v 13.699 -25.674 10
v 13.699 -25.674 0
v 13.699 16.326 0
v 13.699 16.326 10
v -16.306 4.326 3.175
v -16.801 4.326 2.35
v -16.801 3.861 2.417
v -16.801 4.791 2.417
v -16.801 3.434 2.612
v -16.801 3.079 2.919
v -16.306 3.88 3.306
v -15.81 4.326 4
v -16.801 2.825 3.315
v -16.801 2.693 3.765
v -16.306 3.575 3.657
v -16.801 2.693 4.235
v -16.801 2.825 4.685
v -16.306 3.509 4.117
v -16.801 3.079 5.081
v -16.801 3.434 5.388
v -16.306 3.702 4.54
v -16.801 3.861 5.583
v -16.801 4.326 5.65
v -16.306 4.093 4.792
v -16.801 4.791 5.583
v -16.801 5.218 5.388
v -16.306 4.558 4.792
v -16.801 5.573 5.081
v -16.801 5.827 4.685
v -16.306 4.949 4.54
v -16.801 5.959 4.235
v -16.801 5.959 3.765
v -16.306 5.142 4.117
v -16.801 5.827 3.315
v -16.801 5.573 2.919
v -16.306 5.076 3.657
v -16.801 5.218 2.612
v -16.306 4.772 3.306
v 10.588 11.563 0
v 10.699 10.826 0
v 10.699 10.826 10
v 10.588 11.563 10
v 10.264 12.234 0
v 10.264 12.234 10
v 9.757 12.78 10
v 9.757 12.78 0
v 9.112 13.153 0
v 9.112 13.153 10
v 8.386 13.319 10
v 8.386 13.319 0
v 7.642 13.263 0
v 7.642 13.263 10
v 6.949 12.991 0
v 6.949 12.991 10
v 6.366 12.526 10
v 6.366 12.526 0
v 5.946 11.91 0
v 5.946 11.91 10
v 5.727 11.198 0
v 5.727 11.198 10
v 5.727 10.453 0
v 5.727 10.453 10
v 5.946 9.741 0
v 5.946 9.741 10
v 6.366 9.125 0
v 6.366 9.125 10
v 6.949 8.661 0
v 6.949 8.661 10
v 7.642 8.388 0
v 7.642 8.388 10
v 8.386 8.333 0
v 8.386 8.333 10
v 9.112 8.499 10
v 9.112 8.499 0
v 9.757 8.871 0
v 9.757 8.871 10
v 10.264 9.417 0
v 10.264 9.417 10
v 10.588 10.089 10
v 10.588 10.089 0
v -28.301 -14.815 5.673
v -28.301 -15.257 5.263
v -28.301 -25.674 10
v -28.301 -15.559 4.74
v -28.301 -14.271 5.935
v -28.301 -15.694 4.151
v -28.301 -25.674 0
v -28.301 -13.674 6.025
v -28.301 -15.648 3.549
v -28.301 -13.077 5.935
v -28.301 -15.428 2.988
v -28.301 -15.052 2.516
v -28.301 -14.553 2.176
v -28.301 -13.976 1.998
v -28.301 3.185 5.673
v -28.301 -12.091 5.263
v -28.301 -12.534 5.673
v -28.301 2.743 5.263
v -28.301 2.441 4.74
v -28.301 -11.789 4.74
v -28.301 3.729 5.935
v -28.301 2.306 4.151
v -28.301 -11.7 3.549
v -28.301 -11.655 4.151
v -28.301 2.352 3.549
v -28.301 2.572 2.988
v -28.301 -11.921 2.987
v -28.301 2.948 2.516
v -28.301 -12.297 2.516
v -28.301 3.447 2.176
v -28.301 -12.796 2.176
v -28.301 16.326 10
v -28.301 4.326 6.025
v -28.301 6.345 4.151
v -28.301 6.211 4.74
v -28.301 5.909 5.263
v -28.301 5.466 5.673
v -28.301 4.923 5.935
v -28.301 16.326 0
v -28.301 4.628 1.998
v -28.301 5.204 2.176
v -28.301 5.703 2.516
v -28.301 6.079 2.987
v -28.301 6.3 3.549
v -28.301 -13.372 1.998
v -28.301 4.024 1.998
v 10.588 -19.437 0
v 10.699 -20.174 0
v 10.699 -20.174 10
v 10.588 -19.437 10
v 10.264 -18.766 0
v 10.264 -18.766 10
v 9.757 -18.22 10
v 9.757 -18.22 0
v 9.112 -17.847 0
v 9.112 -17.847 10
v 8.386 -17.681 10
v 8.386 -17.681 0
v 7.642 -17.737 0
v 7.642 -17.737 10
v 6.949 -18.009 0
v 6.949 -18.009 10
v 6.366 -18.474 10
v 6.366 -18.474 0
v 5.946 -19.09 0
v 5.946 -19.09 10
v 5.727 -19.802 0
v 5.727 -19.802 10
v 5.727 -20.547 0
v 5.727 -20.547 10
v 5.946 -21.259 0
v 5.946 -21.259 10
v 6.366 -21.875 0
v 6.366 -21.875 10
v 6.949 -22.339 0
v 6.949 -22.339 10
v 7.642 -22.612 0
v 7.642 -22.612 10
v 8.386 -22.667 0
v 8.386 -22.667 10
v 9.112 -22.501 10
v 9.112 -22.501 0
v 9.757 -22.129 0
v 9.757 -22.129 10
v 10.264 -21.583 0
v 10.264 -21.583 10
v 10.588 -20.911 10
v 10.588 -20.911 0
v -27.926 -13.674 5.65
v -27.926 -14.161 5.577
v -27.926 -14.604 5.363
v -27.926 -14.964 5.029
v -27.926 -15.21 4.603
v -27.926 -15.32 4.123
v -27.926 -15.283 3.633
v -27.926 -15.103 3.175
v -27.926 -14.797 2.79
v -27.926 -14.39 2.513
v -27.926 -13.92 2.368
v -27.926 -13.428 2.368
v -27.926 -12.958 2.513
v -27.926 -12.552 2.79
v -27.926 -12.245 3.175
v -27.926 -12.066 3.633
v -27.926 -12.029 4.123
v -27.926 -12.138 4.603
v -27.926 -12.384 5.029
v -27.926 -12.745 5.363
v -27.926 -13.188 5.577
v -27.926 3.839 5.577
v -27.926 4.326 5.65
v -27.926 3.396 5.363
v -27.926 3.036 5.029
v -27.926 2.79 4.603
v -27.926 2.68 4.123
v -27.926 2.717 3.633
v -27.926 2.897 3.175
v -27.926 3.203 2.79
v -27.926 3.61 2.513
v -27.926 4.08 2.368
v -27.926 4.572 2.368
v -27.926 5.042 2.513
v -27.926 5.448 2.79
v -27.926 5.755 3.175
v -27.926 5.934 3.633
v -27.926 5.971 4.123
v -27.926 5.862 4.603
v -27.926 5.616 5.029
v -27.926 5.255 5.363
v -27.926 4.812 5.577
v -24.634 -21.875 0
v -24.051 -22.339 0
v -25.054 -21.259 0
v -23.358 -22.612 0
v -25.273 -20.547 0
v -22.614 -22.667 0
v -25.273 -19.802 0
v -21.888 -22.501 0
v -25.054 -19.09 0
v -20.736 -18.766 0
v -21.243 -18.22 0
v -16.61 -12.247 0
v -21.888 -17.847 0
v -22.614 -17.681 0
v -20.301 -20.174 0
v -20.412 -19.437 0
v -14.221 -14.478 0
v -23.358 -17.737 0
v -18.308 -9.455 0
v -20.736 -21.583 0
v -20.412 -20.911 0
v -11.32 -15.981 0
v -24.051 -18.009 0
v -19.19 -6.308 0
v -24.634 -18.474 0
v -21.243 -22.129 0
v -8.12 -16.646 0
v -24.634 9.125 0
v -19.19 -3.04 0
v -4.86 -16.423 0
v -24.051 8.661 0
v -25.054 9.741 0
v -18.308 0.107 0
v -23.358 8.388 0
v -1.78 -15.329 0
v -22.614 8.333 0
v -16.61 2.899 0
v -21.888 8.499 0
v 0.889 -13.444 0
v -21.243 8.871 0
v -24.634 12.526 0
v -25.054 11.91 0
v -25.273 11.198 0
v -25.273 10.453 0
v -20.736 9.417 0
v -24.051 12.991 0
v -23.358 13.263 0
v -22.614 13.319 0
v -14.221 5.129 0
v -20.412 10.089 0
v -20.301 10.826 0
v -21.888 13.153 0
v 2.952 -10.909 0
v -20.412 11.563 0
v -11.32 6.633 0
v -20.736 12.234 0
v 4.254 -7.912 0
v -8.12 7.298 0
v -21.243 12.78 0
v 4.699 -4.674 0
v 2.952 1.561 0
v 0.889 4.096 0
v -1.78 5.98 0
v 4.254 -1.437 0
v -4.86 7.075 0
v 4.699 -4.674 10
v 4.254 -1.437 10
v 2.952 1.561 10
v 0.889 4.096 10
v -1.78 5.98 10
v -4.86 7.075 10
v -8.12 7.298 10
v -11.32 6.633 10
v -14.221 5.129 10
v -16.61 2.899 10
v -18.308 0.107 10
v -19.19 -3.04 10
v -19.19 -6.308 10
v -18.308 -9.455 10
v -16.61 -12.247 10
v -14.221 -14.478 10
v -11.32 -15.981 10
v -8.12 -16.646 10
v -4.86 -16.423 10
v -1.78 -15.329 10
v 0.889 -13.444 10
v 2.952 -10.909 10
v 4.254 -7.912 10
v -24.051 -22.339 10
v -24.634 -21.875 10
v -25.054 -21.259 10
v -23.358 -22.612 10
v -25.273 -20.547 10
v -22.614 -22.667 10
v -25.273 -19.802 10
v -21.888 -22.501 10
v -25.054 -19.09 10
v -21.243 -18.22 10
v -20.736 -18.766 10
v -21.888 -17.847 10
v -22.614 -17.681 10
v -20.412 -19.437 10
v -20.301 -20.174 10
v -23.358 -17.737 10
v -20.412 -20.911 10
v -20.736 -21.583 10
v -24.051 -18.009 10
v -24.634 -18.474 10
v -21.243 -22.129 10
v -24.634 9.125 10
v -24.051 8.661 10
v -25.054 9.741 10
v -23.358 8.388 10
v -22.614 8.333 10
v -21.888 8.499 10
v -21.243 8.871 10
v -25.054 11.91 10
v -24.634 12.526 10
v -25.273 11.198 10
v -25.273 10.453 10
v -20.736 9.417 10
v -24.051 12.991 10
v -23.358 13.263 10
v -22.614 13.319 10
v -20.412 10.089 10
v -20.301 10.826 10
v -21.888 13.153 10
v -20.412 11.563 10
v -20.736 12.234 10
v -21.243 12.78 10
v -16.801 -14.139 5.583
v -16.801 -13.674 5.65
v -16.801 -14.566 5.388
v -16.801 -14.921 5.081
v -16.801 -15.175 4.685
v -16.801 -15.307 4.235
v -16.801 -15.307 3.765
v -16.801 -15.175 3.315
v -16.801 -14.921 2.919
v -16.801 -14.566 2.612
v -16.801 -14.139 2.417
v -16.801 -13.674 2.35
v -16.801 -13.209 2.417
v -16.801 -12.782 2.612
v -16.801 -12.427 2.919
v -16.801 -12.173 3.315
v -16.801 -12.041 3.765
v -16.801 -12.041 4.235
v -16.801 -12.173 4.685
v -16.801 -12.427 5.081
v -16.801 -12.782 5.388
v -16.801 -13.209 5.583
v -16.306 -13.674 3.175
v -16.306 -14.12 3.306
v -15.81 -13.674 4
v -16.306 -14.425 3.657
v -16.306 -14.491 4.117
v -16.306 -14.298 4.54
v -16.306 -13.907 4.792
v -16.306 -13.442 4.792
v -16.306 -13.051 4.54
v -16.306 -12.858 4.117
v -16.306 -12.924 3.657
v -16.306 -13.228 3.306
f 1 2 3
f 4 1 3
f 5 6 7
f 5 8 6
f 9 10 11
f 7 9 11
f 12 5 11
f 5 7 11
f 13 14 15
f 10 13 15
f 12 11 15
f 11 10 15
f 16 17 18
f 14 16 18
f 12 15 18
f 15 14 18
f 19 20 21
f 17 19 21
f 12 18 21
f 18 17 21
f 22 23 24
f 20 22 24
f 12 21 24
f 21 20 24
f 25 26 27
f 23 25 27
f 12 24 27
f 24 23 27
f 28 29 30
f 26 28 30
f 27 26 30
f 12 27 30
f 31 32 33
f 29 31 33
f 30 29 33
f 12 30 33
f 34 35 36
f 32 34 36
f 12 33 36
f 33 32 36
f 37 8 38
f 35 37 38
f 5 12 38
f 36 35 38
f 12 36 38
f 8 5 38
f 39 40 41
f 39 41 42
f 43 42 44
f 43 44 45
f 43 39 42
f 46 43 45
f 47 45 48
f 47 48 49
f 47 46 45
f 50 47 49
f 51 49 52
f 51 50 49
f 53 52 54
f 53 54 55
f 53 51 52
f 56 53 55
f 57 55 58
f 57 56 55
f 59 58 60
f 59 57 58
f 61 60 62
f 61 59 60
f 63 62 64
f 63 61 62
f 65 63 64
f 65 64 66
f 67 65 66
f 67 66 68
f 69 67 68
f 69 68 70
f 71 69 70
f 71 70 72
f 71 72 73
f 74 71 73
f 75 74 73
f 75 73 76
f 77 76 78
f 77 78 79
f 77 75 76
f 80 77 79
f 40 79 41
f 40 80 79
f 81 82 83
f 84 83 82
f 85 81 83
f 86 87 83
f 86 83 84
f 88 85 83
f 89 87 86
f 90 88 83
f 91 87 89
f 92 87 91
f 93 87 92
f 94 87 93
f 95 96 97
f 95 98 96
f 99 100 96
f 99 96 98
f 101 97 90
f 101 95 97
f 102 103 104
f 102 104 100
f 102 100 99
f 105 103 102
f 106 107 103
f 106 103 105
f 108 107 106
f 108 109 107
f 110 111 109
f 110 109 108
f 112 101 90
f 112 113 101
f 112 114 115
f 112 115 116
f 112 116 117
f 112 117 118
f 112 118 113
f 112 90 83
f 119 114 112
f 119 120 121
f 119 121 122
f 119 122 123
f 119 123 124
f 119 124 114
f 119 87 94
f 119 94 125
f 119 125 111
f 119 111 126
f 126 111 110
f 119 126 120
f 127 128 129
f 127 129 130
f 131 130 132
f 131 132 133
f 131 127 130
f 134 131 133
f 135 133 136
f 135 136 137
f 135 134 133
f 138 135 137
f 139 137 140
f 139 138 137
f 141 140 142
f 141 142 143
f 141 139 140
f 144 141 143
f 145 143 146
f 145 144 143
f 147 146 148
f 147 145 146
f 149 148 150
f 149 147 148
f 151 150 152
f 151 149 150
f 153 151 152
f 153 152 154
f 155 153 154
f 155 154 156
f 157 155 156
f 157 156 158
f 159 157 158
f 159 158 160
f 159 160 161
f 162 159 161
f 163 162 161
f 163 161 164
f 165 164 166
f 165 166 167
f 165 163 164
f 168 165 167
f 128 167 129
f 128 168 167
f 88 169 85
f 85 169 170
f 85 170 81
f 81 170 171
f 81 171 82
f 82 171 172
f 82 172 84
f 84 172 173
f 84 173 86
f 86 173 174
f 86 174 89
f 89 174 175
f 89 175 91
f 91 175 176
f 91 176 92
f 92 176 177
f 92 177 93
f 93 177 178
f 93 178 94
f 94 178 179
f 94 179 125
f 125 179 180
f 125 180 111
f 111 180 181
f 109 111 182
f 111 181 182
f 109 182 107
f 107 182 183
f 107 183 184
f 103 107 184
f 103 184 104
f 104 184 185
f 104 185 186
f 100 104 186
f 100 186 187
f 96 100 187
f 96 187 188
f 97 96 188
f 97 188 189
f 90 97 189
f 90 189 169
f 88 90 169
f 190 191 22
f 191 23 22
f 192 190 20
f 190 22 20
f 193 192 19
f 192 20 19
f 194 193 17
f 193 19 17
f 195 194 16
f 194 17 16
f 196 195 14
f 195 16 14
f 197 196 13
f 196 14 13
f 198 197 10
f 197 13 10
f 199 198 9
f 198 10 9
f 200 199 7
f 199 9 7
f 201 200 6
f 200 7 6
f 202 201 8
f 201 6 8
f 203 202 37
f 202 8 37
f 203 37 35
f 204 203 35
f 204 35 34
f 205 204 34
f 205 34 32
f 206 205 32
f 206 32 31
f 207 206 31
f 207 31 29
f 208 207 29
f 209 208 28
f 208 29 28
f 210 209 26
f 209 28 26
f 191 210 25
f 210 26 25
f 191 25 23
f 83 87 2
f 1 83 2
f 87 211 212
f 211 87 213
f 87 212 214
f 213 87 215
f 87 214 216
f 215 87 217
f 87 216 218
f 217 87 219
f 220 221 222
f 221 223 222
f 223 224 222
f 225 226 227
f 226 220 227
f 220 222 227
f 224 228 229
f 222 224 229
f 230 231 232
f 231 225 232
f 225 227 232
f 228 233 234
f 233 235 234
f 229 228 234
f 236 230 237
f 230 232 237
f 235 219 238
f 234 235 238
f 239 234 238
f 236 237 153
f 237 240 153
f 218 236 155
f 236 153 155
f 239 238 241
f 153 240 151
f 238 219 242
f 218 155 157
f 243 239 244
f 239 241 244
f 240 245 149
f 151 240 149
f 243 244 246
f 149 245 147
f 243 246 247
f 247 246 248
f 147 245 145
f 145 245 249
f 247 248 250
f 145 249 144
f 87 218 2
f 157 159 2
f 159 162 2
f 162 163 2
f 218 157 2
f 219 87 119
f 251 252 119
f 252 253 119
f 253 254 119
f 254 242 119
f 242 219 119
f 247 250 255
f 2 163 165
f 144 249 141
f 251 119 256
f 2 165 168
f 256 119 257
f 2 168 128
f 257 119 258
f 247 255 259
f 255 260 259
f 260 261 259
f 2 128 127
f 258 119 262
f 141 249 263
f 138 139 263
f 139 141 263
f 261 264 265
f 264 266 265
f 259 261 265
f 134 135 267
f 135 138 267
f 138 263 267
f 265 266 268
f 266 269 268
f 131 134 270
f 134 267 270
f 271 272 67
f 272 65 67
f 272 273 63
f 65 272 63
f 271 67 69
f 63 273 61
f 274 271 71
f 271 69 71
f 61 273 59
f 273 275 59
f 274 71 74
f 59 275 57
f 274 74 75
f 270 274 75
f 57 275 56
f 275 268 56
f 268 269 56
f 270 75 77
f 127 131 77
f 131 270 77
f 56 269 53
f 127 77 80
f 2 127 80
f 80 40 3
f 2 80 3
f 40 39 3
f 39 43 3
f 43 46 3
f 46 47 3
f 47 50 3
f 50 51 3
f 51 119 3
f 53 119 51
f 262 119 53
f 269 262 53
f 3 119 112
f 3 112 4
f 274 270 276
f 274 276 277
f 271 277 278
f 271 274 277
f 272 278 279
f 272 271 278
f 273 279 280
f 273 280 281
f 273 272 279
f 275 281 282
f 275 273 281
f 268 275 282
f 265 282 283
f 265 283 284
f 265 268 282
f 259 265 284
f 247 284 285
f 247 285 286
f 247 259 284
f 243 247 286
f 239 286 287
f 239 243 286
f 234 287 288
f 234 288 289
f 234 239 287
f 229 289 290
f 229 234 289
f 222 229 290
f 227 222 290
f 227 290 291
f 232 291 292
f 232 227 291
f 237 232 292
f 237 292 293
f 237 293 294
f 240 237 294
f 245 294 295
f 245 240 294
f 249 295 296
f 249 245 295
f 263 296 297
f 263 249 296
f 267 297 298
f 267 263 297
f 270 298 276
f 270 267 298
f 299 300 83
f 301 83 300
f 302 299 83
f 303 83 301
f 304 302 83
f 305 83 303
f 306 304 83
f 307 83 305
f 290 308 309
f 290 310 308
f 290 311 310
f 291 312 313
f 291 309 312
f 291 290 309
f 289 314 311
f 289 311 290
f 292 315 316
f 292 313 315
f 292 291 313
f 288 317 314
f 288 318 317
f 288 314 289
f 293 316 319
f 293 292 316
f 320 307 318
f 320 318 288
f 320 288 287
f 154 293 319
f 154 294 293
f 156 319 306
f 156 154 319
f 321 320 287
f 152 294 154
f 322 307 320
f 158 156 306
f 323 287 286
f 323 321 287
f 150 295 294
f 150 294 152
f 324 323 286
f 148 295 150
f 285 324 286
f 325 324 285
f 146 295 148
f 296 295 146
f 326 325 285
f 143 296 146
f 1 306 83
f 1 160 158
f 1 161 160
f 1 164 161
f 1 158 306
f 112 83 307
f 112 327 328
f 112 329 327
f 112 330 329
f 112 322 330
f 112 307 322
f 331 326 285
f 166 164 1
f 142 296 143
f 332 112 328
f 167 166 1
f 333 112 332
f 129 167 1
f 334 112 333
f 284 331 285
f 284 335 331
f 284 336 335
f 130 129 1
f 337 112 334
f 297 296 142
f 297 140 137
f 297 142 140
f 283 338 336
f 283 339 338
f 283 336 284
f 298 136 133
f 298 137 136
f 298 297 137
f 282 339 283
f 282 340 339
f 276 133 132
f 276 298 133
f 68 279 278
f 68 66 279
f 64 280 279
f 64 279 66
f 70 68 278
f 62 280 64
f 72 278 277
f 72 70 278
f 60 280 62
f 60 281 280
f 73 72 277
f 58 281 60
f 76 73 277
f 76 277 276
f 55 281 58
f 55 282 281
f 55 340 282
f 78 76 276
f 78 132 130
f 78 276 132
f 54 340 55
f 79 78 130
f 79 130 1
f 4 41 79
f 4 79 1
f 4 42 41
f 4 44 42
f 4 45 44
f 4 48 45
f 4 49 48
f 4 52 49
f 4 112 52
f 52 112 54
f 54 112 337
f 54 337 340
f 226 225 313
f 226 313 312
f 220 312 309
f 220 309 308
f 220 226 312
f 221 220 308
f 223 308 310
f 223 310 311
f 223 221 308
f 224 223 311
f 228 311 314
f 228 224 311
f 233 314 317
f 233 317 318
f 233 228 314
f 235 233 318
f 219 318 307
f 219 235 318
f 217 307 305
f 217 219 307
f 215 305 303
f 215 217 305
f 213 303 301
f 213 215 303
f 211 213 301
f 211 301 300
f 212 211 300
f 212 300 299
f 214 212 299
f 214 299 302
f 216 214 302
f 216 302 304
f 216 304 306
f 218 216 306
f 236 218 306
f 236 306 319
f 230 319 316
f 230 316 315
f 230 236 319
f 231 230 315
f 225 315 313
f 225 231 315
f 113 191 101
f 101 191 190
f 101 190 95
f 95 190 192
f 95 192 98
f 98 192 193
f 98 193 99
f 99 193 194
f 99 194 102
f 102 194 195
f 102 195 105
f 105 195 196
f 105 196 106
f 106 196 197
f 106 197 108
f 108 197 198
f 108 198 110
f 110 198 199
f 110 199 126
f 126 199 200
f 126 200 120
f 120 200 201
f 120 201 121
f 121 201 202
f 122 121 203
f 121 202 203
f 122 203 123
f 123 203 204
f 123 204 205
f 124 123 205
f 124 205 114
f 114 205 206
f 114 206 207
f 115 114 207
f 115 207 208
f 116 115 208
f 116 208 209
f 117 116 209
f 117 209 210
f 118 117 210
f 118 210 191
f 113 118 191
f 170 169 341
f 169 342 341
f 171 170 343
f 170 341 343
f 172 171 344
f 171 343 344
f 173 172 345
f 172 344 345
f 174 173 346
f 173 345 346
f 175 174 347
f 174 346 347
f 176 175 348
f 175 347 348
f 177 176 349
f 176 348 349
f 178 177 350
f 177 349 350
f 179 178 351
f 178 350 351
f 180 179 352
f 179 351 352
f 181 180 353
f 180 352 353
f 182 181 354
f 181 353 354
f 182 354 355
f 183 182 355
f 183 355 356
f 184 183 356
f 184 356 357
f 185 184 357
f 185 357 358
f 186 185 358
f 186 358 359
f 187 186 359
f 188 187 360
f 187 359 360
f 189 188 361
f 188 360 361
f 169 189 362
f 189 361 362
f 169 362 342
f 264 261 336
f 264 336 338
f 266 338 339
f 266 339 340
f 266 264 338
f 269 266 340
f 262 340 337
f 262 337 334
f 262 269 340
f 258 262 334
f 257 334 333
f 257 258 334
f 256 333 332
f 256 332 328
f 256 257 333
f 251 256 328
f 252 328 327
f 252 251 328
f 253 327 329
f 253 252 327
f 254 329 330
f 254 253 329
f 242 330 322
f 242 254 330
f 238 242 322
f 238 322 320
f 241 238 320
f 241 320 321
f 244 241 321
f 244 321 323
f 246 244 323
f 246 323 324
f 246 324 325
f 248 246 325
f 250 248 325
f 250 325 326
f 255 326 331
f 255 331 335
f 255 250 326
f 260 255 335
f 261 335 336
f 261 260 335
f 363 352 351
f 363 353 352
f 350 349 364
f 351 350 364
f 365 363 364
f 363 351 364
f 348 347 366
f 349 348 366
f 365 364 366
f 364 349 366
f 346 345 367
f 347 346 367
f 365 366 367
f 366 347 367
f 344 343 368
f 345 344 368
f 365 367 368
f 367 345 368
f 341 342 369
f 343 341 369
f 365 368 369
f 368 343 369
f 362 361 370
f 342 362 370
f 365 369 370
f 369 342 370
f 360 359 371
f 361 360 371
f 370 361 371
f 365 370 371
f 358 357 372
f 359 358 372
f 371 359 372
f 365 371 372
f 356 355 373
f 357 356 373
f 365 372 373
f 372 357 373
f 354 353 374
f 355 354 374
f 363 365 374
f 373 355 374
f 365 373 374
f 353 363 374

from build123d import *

# Parameters (mm, degrees)
SKIZZE1_W                       = 42
SKIZZE1_H                       = 42
SKIZZE1_R                       = 12
SKIZZE1_R_2                     = 2.5
AUFSATZ_LINEAR_AUSTRAGEN1_DEPTH = 10
SKIZZE2_R                       = 1
SCHNITT_LINEAR_AUSTRAGEN1_DEPTH = 8
M4_GEWINDEBOHRUNG1_D            = 3.3
M4_GEWINDEBOHRUNG1_DEPTH        = 11.5
M4_GEWINDEBOHRUNG1_CSINK_D      = 4.05
M4_GEWINDEBOHRUNG1_CSINK_ANGLE  = 90
M4_GEWINDEBOHRUNG1_TIP          = 0.991420021


with BuildPart() as part:
    # Skizze1 → Aufsatz-Linear austragen1 (new body)
    with BuildSketch(Plane.XY):
        with Locations((-7.301275723, -4.674228082)):
            Rectangle(SKIZZE1_W, SKIZZE1_H)
        with Locations((-7.301275723, -4.674228082)):
            Circle(SKIZZE1_R, mode=Mode.SUBTRACT)
        with Locations((-22.801275723, 10.825771918)):
            Circle(SKIZZE1_R_2, mode=Mode.SUBTRACT)
        with Locations((8.198724277, 10.825771918)):
            Circle(SKIZZE1_R_2, mode=Mode.SUBTRACT)
        with Locations((-22.801275723, -20.174228082)):
            Circle(SKIZZE1_R_2, mode=Mode.SUBTRACT)
        with Locations((8.198724277, -20.174228082)):
            Circle(SKIZZE1_R_2, mode=Mode.SUBTRACT)
    extrude(amount=AUFSATZ_LINEAR_AUSTRAGEN1_DEPTH)

    # Skizze2 → Schnitt-Linear austragen1 (cut)
    with BuildSketch(Plane.ZY.offset(28.301275723)):
        with Locations((4, 4.325771918)):
            Circle(SKIZZE2_R)
        with Locations((4, -13.674228082)):
            Circle(SKIZZE2_R)
    extrude(amount=-SCHNITT_LINEAR_AUSTRAGEN1_DEPTH, mode=Mode.SUBTRACT)

    # M4 Gewindebohrung1
    with Locations(Plane(origin=(-28.301275723, 4.325771918, 4), x_dir=(0, 0, -1), z_dir=(-1, 0, 0))):
        with Locations((0, 0), (0, 18)):
            CounterSinkHole(M4_GEWINDEBOHRUNG1_D / 2, M4_GEWINDEBOHRUNG1_CSINK_D / 2, depth=M4_GEWINDEBOHRUNG1_DEPTH, counter_sink_angle=M4_GEWINDEBOHRUNG1_CSINK_ANGLE)
            with Locations((0, 0, -(M4_GEWINDEBOHRUNG1_DEPTH + M4_GEWINDEBOHRUNG1_TIP / 2))):  # 118° drill point
                Cone(0, M4_GEWINDEBOHRUNG1_D / 2, M4_GEWINDEBOHRUNG1_TIP, mode=Mode.SUBTRACT)


solid = part.part
